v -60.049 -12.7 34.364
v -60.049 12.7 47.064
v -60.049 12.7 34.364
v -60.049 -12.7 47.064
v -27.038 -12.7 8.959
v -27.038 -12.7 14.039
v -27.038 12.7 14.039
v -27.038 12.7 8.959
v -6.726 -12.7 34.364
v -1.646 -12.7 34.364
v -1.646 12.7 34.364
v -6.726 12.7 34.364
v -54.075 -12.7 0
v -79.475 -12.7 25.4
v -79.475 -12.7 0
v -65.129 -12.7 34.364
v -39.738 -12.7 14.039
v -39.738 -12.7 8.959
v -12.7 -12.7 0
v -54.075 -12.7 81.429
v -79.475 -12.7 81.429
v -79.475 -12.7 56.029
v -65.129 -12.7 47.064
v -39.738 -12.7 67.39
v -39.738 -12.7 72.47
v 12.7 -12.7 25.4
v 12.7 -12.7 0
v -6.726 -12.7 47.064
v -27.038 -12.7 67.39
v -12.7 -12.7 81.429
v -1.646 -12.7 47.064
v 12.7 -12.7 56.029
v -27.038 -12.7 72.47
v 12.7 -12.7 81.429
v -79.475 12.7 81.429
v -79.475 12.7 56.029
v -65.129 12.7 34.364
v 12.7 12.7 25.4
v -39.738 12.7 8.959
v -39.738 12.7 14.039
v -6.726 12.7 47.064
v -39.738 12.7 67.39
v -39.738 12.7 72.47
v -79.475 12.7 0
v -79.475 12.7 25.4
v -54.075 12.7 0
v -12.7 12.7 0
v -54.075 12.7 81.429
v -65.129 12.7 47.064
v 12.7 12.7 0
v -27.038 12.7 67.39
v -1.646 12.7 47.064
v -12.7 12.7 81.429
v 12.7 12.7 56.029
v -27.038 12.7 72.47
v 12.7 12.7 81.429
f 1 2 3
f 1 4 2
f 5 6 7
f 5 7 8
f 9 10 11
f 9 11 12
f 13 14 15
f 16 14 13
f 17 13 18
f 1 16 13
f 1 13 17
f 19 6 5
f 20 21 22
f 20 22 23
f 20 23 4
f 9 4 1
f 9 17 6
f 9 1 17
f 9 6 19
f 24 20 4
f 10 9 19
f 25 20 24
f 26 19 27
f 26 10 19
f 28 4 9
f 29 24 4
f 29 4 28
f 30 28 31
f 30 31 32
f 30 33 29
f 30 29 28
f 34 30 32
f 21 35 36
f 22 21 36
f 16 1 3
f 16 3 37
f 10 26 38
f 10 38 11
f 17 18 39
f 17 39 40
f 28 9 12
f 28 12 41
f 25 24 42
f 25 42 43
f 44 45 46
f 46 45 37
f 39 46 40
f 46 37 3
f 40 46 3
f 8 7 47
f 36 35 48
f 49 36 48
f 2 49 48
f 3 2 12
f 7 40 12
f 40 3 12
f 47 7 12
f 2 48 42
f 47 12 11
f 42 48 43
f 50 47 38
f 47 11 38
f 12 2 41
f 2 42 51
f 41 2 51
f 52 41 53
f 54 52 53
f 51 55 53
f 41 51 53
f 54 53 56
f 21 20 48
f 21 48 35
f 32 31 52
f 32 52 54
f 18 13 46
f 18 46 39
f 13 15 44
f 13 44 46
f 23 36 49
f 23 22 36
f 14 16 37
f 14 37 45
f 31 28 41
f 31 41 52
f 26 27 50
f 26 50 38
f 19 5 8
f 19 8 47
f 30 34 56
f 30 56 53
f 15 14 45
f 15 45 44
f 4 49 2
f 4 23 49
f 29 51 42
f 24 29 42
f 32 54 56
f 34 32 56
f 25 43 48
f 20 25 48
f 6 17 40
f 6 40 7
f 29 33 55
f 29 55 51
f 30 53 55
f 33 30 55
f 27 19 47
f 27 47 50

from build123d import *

# Parameters (mm, degrees)
F1_DEPTH = 12.7


with BuildPart() as f1:
    # F0 (on Front) → F1 (new body, symmetric)
    with BuildSketch(Plane.XZ):
        Polygon((-60.049345, 47.064326), (-60.049345, 40.714326), (-6.725921, 40.714326), (-6.725921, 47.064326), (-1.645921, 47.064326), (12.7, 56.028652), (12.7, 81.428652), (-12.7, 81.428652), (-27.037633, 72.469505), (-27.037633, 67.389505), (-39.737633, 67.389505), (-39.737633, 72.469505), (-54.075266, 81.428652), (-79.475266, 81.428652), (-79.475266, 56.028652), (-65.129345, 47.064326), align=None)
        Polygon((-65.129345, 34.364326), (-79.475266, 25.4), (-79.475266, 0), (-54.075266, 0), (-39.737633, 8.959147), (-39.737633, 14.039147), (-27.037633, 14.039147), (-27.037633, 8.959147), (-12.7, 0), (12.7, 0), (12.7, 25.4), (-1.645921, 34.364326), (-6.725921, 34.364326), (-6.725921, 40.714326), (-60.049345, 40.714326), (-60.049345, 34.364326), align=None)
    extrude(amount=F1_DEPTH, both=True)


solid = f1.part
